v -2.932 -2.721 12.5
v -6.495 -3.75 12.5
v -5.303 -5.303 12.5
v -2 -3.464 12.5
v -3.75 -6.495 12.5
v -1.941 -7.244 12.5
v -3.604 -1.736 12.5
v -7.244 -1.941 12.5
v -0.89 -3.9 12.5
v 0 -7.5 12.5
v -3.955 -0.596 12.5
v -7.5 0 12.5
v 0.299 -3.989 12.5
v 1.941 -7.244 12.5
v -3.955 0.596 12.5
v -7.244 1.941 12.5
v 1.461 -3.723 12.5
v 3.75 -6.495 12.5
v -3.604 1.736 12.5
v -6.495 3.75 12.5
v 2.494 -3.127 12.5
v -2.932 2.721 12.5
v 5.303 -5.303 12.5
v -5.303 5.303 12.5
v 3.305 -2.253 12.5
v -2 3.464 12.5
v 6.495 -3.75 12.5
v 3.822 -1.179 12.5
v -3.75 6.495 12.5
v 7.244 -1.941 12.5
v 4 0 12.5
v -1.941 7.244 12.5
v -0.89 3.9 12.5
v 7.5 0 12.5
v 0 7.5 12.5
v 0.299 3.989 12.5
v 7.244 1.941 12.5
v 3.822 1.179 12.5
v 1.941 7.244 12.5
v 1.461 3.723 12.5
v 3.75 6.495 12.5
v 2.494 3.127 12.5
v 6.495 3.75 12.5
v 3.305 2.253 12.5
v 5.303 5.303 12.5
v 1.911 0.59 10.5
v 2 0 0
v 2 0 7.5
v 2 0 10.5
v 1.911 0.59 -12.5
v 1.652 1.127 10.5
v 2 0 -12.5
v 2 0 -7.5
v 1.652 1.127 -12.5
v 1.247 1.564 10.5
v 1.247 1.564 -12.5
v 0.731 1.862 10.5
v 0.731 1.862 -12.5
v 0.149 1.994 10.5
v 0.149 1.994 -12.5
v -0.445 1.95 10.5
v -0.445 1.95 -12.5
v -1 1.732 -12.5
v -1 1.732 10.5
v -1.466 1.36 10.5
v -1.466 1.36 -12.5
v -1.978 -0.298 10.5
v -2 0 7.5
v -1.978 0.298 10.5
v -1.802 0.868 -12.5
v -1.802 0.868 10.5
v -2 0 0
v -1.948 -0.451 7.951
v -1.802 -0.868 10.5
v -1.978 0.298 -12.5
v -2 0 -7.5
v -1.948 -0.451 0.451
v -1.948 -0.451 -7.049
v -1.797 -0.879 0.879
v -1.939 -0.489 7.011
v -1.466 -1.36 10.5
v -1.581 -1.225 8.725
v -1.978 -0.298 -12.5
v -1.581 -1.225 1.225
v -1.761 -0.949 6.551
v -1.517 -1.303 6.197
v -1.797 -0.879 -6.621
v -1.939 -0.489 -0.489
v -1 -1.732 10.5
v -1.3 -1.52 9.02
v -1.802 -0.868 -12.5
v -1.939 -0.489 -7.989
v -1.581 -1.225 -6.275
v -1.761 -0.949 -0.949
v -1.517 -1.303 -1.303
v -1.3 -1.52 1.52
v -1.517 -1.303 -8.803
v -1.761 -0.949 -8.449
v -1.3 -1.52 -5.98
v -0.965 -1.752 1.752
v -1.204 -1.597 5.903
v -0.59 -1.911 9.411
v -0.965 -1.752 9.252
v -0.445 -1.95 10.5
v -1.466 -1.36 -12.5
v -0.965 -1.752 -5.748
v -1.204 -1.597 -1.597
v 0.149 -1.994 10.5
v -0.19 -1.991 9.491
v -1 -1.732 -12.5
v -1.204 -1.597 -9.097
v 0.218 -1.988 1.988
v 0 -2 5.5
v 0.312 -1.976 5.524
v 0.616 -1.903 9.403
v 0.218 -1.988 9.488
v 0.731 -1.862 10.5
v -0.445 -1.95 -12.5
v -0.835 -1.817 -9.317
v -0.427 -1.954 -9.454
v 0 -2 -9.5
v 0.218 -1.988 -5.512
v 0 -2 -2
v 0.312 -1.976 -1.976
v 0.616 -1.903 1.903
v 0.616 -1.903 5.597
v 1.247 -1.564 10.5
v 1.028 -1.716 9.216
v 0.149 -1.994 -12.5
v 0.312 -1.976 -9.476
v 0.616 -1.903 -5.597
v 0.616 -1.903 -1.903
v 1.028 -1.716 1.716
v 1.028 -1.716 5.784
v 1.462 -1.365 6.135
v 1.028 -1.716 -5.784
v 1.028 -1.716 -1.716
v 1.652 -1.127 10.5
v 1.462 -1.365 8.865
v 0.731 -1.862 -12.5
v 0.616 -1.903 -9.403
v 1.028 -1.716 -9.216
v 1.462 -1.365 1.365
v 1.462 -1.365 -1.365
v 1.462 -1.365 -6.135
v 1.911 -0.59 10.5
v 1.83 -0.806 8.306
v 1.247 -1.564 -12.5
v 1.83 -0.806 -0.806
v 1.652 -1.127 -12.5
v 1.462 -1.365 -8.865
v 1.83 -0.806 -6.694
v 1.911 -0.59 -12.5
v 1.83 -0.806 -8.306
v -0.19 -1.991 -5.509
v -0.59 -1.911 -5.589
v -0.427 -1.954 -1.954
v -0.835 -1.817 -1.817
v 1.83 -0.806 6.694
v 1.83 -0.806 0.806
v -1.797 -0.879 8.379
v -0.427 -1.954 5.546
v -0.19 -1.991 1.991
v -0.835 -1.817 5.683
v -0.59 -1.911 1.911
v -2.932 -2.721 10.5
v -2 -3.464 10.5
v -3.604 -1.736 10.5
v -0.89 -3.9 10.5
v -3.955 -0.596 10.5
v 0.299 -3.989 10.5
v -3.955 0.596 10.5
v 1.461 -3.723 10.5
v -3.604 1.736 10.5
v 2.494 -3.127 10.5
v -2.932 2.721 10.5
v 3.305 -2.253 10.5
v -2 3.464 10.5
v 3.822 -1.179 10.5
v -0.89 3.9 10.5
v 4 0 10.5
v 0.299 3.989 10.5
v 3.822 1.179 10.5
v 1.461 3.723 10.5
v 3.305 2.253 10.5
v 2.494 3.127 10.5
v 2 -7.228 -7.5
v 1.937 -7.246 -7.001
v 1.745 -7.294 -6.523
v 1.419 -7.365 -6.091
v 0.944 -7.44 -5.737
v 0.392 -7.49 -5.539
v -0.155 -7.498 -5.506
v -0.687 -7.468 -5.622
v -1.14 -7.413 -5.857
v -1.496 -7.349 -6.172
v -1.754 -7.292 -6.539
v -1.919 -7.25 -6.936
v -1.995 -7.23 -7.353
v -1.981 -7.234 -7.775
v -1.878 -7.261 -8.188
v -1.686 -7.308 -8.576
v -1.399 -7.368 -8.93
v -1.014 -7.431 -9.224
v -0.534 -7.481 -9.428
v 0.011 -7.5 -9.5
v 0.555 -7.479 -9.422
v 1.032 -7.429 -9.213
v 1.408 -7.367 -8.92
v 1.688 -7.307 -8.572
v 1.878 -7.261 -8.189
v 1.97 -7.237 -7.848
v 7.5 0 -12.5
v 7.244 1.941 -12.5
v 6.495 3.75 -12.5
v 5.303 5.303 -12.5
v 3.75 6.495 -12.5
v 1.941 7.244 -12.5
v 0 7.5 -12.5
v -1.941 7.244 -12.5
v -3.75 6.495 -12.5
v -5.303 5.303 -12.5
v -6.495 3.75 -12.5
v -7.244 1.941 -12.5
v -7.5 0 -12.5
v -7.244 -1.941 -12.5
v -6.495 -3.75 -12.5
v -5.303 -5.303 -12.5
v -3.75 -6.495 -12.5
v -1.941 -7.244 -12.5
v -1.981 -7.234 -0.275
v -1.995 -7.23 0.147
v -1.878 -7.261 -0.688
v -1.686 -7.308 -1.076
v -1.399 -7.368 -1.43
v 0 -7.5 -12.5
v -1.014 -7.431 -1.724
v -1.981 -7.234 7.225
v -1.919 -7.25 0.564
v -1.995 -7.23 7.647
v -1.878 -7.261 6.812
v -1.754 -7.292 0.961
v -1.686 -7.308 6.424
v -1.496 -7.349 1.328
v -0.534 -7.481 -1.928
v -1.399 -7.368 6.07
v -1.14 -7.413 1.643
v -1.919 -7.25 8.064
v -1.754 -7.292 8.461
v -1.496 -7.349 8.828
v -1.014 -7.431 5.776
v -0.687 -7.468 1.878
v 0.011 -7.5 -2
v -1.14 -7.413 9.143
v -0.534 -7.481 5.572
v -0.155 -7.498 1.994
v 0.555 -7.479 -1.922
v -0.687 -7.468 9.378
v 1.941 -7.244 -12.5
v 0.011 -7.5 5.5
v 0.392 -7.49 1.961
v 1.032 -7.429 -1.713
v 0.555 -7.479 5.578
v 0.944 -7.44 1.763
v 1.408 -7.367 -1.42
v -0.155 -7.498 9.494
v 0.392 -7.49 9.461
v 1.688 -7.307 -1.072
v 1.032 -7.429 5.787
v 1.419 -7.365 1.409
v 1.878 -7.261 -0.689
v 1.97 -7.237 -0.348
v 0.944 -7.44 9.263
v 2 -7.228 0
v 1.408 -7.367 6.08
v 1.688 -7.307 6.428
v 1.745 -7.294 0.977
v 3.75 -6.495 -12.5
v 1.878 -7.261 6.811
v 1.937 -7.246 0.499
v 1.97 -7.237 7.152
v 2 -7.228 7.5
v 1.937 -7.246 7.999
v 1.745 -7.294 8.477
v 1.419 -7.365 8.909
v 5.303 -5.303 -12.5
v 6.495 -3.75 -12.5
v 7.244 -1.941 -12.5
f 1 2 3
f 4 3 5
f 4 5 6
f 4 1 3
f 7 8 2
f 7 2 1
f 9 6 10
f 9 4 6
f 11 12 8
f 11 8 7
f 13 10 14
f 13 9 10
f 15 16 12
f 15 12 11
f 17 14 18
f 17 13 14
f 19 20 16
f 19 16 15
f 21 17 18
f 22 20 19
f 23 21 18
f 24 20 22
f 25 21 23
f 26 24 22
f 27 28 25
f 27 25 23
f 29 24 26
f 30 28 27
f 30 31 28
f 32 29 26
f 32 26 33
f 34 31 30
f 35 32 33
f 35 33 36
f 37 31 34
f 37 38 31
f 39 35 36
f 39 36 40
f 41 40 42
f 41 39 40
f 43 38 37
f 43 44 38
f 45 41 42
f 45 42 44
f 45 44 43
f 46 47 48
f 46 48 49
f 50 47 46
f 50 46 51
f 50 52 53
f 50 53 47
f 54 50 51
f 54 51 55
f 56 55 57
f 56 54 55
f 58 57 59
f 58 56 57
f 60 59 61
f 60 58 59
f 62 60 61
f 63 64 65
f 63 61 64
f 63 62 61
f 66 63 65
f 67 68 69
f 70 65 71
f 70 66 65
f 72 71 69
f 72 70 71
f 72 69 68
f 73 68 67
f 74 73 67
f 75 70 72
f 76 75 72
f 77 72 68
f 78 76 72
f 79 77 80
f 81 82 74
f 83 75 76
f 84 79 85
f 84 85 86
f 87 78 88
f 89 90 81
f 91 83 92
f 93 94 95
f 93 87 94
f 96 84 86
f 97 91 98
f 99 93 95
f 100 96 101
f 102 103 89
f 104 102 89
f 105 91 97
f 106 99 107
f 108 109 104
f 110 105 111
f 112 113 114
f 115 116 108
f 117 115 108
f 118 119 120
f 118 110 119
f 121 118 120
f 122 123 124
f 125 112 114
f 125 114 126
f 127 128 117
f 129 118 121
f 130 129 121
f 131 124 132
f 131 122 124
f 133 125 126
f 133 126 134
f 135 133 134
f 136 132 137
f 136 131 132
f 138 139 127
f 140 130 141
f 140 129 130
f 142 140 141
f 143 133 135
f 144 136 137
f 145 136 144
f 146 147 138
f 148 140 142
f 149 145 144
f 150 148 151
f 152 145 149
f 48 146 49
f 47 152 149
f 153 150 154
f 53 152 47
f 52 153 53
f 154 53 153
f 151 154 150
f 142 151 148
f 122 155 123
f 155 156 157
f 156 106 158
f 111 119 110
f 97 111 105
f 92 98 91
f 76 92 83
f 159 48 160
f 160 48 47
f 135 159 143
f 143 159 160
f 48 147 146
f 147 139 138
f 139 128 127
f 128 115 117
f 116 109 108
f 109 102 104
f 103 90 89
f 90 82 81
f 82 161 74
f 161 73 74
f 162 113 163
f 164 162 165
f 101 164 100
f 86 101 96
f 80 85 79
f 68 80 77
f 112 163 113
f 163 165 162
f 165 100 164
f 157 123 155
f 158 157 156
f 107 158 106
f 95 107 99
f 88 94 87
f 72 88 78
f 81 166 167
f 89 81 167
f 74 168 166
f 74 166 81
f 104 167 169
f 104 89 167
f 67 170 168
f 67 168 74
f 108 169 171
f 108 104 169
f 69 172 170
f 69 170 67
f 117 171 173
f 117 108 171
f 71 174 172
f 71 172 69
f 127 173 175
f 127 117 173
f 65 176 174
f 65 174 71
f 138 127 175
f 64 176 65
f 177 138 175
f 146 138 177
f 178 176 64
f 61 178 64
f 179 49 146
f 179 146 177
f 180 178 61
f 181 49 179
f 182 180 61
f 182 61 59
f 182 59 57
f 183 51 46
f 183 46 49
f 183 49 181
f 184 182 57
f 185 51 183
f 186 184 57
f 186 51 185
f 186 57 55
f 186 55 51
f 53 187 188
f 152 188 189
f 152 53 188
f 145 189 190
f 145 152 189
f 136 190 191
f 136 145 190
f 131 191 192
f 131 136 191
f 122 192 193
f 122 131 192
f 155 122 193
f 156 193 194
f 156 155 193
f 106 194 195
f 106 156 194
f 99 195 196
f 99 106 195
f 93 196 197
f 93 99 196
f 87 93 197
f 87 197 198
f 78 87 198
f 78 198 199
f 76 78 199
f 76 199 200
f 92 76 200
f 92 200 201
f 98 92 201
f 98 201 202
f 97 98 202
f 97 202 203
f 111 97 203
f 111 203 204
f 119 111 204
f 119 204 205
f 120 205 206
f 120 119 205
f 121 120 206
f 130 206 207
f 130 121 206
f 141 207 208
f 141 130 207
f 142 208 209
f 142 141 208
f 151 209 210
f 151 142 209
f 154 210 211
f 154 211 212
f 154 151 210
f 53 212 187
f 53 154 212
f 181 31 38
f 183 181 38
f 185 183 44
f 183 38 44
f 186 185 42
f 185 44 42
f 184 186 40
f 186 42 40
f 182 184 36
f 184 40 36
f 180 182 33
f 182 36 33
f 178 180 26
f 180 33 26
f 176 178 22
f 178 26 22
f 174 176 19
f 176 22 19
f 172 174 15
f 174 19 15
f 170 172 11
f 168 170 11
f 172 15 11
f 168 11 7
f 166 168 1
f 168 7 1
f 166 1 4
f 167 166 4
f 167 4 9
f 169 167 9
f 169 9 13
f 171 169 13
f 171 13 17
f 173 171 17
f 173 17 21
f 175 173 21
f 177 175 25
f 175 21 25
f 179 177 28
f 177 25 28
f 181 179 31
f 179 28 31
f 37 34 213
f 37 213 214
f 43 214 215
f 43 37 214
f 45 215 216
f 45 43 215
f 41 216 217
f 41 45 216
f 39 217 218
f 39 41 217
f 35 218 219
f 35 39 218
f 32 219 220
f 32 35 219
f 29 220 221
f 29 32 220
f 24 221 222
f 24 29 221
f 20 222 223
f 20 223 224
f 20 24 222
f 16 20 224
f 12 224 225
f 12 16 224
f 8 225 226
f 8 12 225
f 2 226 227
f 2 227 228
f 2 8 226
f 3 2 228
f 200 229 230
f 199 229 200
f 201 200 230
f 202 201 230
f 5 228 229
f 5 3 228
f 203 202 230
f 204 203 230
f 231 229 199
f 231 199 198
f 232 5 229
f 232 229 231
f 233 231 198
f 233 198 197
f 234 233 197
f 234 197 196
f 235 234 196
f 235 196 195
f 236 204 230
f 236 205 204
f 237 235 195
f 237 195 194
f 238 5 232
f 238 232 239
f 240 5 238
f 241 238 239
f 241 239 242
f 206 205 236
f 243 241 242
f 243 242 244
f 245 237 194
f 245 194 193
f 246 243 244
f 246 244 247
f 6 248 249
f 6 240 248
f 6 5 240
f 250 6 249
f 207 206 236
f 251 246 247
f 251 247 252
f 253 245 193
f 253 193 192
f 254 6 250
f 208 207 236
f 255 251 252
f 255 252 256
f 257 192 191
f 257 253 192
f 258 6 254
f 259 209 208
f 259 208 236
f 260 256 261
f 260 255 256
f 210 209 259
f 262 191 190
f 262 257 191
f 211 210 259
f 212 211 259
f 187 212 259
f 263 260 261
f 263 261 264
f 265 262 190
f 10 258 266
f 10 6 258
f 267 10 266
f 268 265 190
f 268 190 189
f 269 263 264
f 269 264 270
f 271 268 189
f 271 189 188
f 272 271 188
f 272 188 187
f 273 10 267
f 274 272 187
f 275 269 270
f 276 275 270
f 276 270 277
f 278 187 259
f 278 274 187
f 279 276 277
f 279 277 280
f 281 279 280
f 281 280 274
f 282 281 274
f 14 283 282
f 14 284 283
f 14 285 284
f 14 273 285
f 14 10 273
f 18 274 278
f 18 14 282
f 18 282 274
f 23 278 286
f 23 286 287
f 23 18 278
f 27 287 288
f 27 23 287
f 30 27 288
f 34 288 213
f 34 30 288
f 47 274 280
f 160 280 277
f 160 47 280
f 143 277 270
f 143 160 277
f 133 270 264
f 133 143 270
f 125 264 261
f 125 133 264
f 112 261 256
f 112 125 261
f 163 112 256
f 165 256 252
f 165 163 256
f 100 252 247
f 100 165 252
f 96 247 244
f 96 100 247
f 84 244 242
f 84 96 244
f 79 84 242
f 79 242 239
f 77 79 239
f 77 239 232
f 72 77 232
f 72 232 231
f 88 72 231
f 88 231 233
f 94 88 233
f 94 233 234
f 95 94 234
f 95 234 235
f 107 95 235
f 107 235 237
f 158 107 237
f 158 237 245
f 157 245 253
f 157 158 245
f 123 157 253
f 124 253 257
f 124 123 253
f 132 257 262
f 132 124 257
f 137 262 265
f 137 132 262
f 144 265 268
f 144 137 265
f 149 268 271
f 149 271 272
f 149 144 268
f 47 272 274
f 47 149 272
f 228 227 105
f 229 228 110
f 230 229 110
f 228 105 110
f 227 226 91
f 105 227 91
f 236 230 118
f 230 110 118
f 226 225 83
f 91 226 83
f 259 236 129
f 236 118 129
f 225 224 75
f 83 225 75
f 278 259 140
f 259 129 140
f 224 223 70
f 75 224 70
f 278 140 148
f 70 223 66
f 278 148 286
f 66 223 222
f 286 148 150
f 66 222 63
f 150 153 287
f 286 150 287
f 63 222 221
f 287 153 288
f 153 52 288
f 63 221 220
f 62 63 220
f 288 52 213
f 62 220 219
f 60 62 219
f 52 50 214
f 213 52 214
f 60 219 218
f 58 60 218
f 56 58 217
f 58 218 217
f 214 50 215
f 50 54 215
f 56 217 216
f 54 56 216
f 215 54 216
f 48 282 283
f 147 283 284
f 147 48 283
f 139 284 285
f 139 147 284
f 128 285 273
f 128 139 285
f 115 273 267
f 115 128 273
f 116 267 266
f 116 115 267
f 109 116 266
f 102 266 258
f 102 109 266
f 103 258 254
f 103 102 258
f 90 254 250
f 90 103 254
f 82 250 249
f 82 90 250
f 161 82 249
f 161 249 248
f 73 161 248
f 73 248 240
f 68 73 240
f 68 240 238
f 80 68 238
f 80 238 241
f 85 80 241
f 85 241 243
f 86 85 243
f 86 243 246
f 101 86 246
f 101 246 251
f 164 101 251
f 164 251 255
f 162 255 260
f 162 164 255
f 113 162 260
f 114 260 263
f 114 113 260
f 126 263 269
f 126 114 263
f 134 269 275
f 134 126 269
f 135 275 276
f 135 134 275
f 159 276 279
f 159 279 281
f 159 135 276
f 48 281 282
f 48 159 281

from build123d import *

# Parameters (mm, degrees)
F0_R     = 7.5
F0_R_2   = 2
F1_DEPTH = 12.5
F2_R     = 2
F3_DEPTH = 25
F4_R     = 4
F5_DEPTH = 2


with BuildPart() as f1:
    # F0 (on Top) → F1 (new body, symmetric)
    with BuildSketch(Plane.XY):
        Circle(F0_R)
        Circle(F0_R_2, mode=Mode.SUBTRACT)
    extrude(amount=F1_DEPTH, both=True)

    # F2 (on Front) → F3 (cut)
    with BuildSketch(Plane.XZ):
        with Locations((0, 7.5)):
            Circle(F2_R)
        with Locations((0, -7.5)):
            Circle(F2_R)
        Circle(F2_R)
    extrude(amount=F3_DEPTH, mode=Mode.SUBTRACT)

    # F4 (on face) → F5 (cut)
    with BuildSketch(Plane.XY.offset(12.5)):
        Circle(F4_R)
    extrude(amount=-F5_DEPTH, mode=Mode.SUBTRACT)


solid = f1.part
